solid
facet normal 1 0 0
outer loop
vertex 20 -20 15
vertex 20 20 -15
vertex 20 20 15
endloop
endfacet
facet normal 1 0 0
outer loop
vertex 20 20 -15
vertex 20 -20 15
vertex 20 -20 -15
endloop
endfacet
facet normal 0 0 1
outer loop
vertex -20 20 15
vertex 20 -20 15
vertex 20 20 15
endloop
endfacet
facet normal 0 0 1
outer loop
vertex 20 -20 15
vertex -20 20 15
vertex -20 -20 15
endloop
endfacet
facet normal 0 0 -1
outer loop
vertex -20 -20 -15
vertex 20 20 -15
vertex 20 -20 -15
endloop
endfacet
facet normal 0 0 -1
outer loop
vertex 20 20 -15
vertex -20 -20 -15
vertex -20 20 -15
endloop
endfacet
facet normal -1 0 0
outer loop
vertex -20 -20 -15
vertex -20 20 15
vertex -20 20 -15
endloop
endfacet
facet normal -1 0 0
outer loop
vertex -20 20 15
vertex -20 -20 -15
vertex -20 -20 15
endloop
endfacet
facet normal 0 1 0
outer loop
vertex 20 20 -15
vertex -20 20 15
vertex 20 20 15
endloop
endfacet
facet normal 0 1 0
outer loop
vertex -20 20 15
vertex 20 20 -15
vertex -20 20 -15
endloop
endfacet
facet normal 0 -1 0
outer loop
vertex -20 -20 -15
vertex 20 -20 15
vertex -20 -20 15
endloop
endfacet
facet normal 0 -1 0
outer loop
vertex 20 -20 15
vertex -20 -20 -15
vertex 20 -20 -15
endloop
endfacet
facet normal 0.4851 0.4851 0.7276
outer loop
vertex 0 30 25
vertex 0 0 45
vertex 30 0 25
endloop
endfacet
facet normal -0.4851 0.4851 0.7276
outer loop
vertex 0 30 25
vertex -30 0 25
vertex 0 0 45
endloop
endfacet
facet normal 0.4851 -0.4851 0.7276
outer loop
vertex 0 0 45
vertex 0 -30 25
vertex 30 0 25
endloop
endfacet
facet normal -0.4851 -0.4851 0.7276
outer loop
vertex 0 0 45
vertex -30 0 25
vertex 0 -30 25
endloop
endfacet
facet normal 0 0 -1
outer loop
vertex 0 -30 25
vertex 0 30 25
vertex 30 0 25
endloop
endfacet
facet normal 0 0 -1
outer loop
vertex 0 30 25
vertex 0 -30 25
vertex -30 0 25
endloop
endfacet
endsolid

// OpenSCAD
union() {
  cube([40,40,30], center=true);
  translate([0,0,25]) cylinder(h=20, r1=30, r2=0, $fn=4);
}
